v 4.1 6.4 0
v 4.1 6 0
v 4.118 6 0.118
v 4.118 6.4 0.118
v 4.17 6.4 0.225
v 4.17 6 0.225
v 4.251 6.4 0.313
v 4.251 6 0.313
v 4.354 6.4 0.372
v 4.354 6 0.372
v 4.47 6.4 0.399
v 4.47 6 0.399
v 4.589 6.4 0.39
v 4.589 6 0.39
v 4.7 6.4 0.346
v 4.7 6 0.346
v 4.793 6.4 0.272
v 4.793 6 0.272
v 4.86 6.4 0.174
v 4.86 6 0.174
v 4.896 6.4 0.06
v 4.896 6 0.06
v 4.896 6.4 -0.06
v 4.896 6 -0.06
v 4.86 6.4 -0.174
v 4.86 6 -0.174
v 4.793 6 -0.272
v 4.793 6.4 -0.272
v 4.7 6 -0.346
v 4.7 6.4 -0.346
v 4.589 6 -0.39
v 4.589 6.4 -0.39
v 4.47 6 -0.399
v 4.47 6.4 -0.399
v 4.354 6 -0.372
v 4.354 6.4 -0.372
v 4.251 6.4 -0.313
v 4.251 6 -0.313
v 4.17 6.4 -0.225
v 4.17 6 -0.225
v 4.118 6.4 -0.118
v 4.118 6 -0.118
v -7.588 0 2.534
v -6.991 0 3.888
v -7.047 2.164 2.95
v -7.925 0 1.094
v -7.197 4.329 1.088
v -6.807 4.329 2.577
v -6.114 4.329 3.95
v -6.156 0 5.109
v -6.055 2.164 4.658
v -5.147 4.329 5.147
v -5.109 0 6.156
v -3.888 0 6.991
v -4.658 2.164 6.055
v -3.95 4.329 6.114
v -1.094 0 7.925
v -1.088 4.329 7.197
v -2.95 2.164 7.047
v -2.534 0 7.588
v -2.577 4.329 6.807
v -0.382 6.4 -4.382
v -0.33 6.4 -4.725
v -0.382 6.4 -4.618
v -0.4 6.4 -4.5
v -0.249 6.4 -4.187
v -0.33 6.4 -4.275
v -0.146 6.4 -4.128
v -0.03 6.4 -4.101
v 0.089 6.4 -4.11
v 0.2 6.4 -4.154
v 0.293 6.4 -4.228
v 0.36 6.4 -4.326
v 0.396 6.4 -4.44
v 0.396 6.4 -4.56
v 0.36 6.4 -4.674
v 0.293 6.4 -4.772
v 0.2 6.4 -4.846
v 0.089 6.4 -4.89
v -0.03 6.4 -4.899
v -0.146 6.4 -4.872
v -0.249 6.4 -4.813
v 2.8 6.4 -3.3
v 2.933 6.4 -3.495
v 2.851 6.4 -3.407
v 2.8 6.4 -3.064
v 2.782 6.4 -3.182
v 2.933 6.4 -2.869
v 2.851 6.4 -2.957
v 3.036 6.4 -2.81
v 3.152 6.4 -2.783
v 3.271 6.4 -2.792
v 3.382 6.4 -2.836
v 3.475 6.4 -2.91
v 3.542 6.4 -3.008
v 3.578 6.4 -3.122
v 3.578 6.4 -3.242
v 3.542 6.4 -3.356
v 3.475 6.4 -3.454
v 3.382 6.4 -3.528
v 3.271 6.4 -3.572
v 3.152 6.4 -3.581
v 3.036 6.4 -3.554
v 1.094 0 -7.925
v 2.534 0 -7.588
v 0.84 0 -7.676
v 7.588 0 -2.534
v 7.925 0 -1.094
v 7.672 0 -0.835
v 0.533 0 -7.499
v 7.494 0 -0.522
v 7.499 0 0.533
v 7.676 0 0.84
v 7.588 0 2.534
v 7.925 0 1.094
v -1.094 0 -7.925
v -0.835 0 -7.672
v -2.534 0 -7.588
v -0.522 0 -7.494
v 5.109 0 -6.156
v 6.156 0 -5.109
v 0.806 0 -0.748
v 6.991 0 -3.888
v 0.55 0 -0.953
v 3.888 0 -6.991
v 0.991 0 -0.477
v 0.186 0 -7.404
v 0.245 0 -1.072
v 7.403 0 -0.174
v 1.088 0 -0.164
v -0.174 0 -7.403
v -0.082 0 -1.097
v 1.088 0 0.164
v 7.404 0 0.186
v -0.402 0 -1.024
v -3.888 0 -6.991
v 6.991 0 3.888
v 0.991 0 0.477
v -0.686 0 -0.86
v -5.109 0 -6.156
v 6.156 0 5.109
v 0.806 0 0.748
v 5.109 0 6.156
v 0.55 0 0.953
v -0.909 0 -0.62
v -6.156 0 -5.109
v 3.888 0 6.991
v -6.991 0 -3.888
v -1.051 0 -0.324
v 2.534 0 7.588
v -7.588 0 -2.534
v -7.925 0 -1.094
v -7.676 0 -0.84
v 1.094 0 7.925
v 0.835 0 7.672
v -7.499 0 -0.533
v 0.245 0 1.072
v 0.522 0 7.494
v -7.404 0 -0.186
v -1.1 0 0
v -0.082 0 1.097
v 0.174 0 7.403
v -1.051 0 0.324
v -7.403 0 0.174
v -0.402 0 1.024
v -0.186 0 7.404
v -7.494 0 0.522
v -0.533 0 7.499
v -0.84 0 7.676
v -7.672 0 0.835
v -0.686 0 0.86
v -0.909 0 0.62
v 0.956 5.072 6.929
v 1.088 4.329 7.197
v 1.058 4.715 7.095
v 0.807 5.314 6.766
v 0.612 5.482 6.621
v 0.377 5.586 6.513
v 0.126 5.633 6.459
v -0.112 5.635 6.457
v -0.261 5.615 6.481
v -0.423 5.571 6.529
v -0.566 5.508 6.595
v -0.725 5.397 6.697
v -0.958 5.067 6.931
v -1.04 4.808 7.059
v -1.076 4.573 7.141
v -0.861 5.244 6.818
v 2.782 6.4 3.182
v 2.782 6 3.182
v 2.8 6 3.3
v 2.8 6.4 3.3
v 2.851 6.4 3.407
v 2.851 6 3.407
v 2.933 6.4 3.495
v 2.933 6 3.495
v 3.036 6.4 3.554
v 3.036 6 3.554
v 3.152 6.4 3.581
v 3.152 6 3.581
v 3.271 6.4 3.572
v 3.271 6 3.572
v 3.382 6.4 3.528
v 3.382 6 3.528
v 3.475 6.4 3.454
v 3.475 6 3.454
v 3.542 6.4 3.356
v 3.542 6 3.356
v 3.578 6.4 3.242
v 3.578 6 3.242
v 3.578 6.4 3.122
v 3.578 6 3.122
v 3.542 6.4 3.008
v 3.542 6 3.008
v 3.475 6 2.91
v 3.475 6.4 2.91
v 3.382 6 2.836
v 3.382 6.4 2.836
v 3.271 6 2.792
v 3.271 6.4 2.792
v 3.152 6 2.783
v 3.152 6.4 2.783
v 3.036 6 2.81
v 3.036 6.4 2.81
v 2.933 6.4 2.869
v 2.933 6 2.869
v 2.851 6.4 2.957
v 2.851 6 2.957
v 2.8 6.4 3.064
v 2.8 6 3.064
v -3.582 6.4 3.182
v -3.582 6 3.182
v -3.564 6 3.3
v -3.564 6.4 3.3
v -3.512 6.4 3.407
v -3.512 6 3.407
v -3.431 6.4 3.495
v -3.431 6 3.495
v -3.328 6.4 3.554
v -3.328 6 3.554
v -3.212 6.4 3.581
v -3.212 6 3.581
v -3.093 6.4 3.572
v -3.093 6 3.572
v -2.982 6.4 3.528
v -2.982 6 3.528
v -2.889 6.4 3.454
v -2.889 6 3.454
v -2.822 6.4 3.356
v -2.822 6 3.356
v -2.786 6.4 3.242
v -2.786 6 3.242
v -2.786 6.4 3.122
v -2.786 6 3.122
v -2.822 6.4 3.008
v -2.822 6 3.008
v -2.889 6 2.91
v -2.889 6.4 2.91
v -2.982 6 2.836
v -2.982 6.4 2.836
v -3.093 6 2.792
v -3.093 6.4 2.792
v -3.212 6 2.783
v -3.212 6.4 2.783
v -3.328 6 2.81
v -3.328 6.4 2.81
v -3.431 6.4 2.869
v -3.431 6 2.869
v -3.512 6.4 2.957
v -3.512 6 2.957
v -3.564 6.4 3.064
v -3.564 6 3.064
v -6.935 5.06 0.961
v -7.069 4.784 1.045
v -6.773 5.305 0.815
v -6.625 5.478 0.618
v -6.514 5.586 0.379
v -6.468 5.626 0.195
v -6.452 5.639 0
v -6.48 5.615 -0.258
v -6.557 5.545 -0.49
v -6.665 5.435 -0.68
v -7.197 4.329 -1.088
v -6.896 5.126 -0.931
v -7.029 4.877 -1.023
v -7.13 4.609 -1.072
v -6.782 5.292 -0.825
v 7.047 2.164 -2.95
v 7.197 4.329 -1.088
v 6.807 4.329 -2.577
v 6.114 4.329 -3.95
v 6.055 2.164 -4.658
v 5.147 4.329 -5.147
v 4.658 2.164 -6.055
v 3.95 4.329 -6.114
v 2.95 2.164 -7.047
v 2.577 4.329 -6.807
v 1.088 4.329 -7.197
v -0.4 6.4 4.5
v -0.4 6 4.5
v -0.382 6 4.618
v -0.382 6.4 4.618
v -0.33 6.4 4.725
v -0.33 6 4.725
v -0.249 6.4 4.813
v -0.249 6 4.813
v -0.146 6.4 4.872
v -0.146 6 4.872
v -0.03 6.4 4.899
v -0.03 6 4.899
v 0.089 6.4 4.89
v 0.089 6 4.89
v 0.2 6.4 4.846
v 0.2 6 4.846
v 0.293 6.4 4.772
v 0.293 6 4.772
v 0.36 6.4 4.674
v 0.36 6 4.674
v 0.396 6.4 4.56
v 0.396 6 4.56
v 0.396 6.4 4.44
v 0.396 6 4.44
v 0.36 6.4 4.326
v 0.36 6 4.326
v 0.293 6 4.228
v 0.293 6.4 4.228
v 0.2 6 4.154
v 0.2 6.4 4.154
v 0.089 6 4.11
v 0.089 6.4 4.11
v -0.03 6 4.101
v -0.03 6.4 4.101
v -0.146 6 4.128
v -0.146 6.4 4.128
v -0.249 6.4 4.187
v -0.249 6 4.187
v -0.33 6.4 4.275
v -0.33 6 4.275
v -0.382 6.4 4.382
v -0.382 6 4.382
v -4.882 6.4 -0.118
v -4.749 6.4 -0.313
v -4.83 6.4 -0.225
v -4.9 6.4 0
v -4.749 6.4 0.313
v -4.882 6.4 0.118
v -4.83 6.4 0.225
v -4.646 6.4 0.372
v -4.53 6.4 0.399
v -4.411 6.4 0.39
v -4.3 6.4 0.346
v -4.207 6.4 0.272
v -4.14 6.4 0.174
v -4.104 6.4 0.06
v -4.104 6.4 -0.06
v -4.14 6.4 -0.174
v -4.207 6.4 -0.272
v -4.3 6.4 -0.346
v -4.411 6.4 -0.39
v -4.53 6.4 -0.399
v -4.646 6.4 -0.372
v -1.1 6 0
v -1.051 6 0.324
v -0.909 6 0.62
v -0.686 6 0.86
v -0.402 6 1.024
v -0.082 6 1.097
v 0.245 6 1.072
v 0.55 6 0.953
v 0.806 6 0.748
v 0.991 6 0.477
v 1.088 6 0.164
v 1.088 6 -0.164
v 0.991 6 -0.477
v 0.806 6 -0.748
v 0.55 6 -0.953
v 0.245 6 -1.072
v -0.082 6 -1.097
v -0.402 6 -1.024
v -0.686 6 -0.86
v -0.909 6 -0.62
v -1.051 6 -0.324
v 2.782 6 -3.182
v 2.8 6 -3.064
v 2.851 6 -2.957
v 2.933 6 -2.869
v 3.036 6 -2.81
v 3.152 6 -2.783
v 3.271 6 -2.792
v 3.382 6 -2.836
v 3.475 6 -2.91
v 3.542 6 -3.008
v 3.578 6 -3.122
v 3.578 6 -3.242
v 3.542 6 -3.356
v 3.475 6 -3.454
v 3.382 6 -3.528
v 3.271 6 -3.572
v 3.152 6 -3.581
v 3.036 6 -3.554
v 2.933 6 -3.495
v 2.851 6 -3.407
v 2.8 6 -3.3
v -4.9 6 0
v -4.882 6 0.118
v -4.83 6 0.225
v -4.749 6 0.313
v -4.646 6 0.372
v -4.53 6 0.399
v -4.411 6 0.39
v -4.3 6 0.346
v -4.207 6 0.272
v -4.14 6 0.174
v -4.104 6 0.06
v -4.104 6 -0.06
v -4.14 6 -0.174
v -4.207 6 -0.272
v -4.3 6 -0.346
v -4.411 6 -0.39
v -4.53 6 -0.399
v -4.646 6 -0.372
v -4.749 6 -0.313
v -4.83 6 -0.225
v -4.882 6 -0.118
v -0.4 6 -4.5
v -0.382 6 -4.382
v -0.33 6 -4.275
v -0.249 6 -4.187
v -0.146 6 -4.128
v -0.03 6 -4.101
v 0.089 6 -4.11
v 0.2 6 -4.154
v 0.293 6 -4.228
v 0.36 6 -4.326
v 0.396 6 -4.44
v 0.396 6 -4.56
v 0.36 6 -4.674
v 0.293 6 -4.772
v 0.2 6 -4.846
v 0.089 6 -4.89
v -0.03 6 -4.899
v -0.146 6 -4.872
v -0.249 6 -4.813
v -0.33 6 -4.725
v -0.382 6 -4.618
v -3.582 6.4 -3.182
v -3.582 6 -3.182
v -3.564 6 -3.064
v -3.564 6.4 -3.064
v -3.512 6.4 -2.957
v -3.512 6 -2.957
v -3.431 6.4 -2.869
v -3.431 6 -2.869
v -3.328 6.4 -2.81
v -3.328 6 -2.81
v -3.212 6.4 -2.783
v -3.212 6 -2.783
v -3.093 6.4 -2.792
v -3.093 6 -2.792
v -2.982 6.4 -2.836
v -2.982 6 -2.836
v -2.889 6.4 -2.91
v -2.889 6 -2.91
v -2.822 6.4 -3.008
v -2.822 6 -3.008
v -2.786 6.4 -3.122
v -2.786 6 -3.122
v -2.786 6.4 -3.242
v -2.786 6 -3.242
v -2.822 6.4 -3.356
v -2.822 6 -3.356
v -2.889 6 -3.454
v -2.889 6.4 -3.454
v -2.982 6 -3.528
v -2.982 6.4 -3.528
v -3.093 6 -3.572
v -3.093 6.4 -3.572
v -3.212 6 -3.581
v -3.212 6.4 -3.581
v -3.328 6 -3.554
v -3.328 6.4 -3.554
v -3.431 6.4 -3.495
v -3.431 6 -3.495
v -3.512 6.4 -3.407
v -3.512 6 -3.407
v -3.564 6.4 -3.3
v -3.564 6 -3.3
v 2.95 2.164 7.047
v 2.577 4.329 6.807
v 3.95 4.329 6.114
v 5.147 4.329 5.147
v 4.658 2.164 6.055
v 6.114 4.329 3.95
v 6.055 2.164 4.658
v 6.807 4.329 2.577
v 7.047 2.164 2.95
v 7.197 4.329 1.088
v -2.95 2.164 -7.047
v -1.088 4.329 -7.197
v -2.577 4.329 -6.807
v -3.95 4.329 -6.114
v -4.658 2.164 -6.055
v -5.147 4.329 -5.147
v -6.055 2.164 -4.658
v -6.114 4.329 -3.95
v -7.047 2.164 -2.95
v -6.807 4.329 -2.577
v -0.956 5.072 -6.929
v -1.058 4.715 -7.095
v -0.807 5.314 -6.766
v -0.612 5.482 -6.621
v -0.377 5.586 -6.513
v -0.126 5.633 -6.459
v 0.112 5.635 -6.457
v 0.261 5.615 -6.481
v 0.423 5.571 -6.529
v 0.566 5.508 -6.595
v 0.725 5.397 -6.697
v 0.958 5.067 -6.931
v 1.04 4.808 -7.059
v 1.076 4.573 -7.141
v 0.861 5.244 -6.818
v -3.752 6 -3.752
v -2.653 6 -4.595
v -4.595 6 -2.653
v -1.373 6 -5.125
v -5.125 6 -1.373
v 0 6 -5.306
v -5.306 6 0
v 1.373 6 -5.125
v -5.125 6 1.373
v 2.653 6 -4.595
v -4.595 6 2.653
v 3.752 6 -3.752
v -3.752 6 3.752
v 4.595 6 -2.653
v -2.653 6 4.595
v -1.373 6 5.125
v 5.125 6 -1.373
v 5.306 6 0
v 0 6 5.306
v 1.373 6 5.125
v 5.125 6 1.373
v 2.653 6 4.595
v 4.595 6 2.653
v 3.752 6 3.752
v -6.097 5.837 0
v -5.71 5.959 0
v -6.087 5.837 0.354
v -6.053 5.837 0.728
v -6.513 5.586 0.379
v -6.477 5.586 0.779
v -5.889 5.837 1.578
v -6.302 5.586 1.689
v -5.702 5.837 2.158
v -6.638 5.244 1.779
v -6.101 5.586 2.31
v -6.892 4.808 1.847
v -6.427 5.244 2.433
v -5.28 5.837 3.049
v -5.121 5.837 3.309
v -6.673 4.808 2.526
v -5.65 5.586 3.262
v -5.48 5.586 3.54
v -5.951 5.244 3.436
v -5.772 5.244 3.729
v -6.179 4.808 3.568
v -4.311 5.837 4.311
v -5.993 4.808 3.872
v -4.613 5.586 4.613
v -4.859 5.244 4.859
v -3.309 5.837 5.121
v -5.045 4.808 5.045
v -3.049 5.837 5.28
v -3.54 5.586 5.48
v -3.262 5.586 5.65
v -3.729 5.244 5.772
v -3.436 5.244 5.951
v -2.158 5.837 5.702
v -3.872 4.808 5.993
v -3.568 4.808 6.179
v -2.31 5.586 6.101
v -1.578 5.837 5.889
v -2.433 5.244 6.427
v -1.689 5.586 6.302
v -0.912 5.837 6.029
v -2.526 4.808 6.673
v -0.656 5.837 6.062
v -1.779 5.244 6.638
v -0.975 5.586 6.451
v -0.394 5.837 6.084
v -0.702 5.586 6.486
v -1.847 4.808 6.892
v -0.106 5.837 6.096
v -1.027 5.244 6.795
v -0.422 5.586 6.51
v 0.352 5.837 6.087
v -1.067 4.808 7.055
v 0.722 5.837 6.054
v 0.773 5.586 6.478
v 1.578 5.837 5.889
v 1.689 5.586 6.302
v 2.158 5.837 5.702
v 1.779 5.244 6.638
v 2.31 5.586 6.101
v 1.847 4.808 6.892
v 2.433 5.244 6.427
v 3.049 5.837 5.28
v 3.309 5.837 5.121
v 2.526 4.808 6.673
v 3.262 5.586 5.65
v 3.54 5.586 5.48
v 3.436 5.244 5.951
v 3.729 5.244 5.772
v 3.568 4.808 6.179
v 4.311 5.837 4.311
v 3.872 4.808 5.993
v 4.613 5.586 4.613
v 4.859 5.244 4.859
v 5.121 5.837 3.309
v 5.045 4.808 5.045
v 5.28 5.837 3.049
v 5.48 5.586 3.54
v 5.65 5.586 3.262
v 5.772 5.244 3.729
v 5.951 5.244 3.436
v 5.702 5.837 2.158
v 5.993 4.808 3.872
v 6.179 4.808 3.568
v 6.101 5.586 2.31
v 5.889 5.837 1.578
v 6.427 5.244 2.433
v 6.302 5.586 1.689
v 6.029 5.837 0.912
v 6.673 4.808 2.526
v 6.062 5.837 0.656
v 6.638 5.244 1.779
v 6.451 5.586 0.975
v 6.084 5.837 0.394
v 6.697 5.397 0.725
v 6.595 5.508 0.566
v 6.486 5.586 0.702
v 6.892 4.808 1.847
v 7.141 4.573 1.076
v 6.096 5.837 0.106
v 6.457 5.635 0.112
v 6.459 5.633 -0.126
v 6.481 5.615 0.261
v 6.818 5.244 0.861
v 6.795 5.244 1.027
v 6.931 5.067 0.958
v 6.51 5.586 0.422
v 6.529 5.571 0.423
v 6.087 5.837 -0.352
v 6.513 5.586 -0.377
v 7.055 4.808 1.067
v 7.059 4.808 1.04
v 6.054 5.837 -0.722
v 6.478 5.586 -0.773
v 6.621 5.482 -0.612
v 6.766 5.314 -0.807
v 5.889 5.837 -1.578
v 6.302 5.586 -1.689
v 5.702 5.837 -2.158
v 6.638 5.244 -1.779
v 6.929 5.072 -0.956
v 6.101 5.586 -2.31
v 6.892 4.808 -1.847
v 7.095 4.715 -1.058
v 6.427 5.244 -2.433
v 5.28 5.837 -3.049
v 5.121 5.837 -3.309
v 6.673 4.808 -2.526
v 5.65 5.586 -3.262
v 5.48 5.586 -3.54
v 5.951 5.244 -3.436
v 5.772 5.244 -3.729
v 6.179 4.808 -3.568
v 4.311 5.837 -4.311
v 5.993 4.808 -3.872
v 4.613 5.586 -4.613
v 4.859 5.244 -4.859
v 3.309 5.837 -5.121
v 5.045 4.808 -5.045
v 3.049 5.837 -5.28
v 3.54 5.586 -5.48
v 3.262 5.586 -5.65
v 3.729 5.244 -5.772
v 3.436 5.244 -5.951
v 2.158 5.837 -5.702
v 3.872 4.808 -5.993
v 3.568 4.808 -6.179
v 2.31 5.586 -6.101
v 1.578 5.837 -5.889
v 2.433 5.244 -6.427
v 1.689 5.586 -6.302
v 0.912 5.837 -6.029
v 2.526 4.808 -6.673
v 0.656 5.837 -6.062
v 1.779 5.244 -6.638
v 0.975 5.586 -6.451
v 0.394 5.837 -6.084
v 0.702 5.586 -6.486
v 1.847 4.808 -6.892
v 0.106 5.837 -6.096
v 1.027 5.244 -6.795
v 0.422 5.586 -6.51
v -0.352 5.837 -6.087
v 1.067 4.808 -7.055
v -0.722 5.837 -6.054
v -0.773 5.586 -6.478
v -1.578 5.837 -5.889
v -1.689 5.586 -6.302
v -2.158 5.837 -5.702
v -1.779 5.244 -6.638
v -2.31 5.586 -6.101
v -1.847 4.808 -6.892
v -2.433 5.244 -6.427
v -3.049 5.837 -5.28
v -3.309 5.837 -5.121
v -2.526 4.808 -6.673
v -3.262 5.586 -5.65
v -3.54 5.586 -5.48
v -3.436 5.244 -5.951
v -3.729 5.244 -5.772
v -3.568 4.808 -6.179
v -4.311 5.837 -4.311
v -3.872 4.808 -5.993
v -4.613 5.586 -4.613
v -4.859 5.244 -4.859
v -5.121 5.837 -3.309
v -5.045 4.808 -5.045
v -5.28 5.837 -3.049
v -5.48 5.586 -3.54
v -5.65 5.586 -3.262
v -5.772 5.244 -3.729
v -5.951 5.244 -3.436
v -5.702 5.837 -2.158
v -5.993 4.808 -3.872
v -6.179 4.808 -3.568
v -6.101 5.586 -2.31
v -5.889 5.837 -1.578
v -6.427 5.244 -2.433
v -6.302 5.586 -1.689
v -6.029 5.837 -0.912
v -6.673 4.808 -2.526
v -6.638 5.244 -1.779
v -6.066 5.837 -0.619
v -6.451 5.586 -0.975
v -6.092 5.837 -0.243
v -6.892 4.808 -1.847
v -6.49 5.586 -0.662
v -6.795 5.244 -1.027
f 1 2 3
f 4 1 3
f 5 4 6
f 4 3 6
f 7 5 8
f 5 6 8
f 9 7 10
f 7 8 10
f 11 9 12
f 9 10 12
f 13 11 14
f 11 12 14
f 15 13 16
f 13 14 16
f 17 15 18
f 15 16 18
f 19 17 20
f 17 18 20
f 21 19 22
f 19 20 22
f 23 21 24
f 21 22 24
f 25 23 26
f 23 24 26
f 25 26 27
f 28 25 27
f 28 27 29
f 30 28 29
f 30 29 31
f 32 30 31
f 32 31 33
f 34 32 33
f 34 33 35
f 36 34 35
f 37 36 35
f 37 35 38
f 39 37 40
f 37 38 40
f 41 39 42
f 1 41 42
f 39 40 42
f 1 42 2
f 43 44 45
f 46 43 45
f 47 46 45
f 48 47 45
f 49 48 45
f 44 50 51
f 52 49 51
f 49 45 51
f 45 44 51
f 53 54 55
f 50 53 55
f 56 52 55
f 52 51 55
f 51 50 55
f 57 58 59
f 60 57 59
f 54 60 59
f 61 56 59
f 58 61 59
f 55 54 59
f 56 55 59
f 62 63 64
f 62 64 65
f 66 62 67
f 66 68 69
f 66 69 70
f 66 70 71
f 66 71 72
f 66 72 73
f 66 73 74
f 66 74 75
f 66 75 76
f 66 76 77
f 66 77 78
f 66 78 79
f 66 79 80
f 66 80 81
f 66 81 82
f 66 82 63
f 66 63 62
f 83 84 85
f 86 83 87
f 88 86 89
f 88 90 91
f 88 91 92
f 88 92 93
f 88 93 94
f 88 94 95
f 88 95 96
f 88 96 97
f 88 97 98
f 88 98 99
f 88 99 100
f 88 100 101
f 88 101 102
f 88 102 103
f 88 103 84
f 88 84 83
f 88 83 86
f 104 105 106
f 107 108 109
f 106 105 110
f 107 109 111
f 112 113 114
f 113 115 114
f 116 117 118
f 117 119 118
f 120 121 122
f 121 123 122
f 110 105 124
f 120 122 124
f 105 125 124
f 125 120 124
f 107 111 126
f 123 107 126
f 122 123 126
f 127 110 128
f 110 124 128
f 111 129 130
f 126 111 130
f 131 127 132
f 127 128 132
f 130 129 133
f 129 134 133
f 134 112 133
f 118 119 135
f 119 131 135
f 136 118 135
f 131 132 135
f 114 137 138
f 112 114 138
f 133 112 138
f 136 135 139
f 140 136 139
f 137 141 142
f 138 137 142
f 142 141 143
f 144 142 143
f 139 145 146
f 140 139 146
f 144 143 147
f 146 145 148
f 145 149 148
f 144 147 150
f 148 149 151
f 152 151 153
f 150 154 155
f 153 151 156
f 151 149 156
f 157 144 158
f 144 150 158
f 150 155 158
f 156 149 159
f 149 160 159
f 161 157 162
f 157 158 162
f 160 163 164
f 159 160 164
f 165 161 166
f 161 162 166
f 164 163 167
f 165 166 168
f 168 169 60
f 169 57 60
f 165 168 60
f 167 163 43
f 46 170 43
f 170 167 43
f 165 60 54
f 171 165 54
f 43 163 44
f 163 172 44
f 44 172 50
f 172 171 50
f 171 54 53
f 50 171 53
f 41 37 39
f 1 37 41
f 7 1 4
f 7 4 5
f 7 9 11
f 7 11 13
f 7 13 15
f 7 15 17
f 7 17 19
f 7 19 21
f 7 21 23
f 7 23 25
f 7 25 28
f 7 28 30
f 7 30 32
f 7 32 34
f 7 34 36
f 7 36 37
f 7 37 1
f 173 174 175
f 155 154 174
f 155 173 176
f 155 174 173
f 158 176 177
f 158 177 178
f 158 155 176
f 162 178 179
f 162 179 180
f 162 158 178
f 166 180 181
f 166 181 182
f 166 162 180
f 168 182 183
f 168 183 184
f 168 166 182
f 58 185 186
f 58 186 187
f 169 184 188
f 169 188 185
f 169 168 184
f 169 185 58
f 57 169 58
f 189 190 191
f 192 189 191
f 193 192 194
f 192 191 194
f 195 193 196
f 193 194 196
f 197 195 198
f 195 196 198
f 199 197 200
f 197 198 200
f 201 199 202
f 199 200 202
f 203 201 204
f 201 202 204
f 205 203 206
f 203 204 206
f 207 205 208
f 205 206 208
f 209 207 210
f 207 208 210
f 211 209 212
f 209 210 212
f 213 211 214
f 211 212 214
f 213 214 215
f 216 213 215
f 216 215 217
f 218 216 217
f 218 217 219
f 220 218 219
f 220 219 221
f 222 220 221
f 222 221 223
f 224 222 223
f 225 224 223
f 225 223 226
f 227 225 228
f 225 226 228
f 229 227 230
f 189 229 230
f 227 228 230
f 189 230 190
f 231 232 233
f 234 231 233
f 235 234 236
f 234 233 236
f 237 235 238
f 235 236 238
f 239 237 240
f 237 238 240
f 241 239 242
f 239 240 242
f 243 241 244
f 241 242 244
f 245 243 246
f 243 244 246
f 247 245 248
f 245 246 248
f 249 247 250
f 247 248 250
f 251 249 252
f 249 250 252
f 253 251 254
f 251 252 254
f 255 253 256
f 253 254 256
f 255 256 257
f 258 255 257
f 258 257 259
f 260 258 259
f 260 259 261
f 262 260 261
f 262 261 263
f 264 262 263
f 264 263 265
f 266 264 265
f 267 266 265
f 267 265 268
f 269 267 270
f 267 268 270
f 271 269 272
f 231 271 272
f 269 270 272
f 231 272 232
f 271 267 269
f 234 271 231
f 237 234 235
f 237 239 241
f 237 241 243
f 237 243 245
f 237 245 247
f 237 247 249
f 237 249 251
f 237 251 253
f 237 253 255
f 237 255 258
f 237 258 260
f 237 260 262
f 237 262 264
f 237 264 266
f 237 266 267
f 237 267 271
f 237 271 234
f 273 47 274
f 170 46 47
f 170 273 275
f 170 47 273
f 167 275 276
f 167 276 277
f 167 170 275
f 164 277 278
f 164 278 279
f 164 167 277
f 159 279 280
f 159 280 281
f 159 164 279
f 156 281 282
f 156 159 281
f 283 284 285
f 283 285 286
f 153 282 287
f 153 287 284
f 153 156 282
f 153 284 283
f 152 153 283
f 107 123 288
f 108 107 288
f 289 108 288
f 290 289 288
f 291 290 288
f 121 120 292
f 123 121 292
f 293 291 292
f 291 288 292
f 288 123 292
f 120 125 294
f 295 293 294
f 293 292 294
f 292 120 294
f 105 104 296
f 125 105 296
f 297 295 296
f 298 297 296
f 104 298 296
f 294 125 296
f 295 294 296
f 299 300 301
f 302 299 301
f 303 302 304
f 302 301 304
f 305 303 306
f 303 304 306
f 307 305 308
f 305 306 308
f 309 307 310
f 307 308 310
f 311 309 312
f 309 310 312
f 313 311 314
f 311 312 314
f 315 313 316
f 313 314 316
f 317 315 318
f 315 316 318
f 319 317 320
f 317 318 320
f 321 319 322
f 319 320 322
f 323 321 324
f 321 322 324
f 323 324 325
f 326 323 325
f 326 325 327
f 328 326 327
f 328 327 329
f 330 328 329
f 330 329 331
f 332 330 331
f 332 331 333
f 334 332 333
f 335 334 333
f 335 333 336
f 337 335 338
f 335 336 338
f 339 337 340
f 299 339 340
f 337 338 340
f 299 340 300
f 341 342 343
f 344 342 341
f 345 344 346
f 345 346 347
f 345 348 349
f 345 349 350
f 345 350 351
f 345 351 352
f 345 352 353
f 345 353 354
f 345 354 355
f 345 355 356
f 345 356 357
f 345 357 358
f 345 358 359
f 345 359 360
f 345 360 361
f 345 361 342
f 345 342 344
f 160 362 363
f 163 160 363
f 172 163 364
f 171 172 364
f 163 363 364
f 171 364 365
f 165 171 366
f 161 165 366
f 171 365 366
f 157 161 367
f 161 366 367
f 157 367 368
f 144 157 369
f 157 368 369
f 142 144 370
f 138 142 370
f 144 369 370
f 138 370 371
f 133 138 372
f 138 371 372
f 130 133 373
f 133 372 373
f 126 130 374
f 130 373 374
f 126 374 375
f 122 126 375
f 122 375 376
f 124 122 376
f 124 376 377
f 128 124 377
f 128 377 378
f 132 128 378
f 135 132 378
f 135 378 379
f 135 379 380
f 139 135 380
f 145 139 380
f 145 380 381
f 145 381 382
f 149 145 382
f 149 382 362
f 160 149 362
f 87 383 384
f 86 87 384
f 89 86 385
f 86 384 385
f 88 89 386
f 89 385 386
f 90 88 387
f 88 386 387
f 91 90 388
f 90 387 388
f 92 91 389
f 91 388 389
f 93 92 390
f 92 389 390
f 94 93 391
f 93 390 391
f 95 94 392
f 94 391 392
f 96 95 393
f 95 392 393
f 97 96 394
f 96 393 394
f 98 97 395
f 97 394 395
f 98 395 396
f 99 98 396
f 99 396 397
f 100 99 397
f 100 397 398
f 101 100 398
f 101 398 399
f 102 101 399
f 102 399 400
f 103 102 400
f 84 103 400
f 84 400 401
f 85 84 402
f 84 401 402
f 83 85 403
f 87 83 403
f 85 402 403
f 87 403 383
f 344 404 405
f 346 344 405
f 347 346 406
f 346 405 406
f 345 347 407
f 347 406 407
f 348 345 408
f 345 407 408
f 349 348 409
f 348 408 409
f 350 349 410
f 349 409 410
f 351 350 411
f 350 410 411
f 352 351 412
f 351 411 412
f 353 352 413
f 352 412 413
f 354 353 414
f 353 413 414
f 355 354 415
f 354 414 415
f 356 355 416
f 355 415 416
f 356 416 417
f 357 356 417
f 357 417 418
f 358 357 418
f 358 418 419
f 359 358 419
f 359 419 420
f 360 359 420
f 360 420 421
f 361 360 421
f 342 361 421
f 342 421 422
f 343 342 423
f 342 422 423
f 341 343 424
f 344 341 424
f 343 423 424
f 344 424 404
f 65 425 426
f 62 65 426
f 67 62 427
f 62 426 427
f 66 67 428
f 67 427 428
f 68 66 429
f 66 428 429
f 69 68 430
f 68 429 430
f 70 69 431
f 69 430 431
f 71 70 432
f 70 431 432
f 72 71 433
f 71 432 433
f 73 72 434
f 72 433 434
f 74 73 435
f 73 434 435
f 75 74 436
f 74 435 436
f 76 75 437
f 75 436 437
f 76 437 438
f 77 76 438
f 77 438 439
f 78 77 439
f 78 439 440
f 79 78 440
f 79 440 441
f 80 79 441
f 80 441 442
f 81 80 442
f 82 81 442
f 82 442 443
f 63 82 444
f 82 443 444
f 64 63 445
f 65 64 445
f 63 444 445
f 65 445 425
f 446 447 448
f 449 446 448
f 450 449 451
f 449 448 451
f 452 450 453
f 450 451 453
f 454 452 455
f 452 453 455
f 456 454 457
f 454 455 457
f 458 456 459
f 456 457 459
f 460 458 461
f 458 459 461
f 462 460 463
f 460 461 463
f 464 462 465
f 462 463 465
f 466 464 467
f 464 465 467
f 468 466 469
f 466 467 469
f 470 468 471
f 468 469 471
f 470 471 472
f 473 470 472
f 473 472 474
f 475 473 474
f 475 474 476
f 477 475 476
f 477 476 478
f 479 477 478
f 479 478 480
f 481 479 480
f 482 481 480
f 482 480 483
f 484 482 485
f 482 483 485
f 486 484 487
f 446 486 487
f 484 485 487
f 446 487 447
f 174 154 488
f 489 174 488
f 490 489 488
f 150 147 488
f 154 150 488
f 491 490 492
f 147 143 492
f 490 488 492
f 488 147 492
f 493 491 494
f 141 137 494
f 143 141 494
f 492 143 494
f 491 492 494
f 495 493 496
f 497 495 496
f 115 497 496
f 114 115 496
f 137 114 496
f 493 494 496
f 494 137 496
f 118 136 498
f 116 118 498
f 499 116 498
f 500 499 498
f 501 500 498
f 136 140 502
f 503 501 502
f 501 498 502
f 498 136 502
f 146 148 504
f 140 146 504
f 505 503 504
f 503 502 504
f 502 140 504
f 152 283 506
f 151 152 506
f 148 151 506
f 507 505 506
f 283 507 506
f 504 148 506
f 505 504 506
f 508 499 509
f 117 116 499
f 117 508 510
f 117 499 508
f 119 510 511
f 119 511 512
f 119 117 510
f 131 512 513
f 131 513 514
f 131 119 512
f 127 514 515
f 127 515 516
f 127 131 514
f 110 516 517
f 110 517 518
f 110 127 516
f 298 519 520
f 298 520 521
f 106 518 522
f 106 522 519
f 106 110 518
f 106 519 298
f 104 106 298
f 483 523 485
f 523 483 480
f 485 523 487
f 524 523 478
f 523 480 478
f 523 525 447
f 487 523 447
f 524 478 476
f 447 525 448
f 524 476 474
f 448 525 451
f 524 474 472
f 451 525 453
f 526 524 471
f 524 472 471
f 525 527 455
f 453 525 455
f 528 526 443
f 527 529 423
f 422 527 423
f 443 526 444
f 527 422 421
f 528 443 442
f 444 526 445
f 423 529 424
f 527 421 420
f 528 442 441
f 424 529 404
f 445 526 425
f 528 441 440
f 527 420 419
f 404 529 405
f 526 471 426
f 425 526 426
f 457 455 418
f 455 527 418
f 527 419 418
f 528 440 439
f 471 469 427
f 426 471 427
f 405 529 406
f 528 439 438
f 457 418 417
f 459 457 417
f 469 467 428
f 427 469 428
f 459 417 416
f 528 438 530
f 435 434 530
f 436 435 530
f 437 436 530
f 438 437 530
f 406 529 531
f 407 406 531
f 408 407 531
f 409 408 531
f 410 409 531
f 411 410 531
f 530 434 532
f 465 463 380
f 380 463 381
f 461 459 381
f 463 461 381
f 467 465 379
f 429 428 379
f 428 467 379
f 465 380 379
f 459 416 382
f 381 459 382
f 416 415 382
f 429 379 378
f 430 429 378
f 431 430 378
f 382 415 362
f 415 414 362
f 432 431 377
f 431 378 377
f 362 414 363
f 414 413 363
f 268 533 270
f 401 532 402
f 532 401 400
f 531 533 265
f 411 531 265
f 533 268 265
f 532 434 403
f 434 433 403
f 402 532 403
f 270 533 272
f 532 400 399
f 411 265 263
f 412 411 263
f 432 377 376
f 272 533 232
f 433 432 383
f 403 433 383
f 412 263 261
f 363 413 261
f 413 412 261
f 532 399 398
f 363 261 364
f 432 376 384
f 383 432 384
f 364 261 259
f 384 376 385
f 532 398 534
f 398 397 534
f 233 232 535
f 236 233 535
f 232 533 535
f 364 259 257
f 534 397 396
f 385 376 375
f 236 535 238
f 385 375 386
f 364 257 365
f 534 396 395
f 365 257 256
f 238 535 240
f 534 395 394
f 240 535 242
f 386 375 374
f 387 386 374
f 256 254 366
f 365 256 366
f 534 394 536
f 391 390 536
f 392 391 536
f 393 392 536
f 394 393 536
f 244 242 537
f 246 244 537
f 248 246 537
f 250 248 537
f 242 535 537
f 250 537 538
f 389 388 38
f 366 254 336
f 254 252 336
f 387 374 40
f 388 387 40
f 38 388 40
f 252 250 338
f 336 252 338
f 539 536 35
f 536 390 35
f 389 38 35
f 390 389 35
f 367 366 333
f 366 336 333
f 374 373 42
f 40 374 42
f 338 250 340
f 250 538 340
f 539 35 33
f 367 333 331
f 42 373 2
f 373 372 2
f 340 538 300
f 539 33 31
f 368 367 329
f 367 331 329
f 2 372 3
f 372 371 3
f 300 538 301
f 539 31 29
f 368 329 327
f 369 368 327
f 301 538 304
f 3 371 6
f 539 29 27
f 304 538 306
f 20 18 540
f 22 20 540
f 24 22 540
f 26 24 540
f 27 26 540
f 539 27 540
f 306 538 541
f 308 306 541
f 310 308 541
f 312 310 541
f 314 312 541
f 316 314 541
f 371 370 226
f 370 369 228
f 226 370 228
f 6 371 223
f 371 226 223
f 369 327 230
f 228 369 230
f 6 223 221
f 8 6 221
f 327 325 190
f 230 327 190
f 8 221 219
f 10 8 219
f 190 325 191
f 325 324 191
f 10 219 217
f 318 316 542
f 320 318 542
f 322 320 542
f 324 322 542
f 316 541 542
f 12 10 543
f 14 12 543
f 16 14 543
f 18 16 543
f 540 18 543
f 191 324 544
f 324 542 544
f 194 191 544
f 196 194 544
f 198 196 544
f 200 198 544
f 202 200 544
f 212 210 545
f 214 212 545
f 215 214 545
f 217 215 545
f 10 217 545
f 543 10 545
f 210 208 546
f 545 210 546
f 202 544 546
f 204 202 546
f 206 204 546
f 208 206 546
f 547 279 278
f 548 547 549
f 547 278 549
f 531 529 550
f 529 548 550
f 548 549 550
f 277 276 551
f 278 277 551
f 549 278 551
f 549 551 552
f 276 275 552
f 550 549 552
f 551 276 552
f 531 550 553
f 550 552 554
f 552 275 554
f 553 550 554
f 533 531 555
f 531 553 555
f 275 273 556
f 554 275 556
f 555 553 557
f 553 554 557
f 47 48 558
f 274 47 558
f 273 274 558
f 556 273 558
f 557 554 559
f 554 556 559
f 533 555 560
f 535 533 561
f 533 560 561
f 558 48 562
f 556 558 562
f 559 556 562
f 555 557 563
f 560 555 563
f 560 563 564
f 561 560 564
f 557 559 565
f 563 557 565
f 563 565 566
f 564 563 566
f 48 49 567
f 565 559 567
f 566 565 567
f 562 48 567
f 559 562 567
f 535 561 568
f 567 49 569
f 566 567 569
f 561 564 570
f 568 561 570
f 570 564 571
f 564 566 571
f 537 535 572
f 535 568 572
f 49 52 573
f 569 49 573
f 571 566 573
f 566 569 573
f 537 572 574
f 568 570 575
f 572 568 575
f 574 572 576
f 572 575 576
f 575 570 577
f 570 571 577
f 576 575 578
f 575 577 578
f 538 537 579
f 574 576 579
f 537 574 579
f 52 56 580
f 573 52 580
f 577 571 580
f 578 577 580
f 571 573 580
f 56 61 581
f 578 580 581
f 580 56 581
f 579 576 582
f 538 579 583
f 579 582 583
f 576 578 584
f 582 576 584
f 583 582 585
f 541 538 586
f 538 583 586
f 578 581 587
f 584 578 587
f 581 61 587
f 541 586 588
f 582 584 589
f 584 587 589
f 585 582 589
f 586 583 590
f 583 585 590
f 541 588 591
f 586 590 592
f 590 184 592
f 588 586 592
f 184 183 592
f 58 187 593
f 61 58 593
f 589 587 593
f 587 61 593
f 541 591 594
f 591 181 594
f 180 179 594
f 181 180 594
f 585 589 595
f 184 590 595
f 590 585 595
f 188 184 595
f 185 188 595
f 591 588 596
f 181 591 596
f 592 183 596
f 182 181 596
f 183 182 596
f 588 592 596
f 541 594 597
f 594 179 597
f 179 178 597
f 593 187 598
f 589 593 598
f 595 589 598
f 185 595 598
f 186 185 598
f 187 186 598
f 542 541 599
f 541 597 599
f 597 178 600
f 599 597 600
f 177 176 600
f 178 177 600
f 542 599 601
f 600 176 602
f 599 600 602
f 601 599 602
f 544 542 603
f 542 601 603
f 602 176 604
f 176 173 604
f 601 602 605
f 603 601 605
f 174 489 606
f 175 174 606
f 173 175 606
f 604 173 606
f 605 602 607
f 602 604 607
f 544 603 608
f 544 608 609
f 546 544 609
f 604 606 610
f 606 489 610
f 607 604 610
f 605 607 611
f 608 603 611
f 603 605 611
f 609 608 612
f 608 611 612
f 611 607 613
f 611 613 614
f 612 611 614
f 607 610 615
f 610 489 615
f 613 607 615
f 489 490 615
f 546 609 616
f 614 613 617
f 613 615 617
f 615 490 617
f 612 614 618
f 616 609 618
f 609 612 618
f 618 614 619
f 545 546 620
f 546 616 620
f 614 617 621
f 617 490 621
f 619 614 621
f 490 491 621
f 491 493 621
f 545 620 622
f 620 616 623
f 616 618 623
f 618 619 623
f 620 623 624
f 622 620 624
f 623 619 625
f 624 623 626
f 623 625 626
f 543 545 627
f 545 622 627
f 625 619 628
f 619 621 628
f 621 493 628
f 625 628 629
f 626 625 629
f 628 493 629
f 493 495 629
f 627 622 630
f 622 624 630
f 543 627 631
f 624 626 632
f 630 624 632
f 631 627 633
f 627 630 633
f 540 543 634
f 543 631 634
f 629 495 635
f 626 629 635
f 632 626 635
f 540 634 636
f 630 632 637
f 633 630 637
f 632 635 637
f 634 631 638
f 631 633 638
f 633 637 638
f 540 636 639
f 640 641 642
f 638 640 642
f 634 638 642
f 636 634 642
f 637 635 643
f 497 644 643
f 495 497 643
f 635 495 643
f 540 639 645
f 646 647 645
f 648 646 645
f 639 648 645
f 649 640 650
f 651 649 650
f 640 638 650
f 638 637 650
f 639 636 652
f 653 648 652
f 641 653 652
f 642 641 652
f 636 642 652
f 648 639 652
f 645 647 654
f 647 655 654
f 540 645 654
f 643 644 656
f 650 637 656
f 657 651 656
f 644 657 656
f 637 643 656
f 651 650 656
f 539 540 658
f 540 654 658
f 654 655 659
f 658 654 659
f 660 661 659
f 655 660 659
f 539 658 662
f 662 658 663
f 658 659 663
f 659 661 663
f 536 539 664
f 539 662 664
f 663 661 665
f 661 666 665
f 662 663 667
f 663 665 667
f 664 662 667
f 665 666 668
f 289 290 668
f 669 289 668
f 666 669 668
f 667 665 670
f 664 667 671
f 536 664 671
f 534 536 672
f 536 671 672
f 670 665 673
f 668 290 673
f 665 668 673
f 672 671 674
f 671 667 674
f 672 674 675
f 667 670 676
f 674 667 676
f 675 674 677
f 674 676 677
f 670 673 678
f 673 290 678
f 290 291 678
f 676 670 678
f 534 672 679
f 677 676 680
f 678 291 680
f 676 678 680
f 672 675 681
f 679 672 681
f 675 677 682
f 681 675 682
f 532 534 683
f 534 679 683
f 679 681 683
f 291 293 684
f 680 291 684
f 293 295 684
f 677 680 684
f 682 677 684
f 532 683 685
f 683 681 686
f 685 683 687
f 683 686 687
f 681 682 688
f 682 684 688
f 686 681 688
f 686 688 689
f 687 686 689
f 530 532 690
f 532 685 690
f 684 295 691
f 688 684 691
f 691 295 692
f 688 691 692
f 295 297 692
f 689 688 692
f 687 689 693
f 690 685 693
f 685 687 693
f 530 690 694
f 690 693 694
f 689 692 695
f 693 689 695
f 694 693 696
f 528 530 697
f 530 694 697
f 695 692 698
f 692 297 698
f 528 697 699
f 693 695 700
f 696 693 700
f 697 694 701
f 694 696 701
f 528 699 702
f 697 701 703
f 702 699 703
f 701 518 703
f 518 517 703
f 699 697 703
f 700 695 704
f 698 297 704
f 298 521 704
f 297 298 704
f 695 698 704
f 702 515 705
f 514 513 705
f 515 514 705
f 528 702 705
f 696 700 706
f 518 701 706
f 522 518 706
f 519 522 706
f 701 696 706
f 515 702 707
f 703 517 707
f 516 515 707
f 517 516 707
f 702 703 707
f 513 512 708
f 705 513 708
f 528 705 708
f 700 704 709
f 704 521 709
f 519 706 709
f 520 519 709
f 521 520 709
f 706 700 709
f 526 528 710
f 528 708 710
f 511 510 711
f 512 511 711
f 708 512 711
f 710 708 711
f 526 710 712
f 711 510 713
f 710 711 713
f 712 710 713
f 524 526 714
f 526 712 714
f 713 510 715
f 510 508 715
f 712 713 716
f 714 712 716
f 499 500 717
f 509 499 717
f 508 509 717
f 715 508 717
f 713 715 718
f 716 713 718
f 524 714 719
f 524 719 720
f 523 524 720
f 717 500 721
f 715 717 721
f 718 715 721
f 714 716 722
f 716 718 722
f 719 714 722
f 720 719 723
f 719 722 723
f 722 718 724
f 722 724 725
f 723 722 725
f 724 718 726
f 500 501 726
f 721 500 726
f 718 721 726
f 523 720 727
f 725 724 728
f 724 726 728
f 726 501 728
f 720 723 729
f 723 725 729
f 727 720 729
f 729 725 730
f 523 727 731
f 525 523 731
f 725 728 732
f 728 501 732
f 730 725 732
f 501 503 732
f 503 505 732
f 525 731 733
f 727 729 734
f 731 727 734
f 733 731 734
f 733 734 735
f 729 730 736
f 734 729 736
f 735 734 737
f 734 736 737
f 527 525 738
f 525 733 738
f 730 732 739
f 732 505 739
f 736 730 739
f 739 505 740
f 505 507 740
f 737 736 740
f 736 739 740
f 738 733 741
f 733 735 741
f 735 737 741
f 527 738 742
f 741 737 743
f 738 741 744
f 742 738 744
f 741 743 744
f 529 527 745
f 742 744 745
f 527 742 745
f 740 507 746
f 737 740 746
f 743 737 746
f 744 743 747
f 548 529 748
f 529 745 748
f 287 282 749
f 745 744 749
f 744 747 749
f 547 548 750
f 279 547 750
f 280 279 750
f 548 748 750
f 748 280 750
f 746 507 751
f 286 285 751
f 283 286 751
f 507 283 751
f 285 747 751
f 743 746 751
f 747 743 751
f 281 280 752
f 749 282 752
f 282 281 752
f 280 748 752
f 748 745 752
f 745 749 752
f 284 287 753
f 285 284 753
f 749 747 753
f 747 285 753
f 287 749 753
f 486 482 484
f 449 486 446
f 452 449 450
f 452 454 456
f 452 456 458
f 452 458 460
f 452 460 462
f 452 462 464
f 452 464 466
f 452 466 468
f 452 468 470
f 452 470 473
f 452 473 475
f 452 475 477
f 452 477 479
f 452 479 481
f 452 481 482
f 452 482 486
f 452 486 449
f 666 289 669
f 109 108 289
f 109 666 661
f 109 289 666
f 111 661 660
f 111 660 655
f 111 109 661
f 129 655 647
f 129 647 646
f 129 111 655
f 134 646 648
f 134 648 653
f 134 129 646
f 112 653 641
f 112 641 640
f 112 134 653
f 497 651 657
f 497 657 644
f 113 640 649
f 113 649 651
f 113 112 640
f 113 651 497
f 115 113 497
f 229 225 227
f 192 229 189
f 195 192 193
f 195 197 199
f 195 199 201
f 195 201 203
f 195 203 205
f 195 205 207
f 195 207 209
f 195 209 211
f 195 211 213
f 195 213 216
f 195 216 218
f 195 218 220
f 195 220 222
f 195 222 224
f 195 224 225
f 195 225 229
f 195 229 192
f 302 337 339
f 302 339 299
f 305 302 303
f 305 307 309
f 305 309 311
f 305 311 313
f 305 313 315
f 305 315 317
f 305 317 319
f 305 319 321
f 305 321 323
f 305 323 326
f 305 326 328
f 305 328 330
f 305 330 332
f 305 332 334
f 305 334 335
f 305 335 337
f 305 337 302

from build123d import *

# Parameters (mm, degrees)
F2_R     = 0.4
F3_DEPTH = 0.4
F6_COUNT = 4
F8_R     = 1.1
F9_DEPTH = 6.001


with BuildPart() as f1:
    # F0 (on Top) → F1 (revolve)
    with BuildSketch(Plane.XY):
        with BuildLine():
            Line((-8, 0), (0, 0))
            Line((0, 0), (0, 6))
            Line((0, 6), (-5.305746, 6))
            ThreePointArc((-5.305746, 6), (-6.598496, 5.52604), (-7.278534, 4.328798))
            Line((-7.278534, 4.328798), (-8, 0))
        make_face()
    revolve(axis=Axis((0, 13.402597, 0), (0, 1, 0)))

    # F2 (on face) → F3 (join)
    with BuildSketch(Plane(origin=(0, 6, 0), x_dir=(-1, 0, 0), z_dir=(0, 1, 0))):
        with Locations((0, 4.5)):
            Circle(F2_R)
        with Locations((4.5, 0)):
            Circle(F2_R)
        with Locations((0, -4.5)):
            Circle(F2_R)
        with Locations((-4.5, 0)):
            Circle(F2_R)
        with Locations((-3.181981, 3.181981)):
            Circle(F2_R)
        with Locations((3.181981, 3.181981)):
            Circle(F2_R)
        with Locations((3.181981, -3.181981)):
            Circle(F2_R)
        with Locations((-3.181981, -3.181981)):
            Circle(F2_R)
    extrude(amount=F3_DEPTH)


with BuildPart() as f5:
    # F4 (on Right) → F5 (revolve)
    with BuildSketch(Plane.YZ):
        Polygon((-0.443557, 10.304272), (-0.673715, 8.923321), (6.578678, 7.714589), (6.808836, 9.09554), align=None)
    revolve(axis=Axis((0, 5.520192, 7.891003), (0, 0.986394, -0.164399)))


with BuildPart() as f6_1:
    # F6: instance of F5
    add(f5.part.rotate(Axis((0, 0, 0), (0, 1, 0)), 1 * 360 / F6_COUNT))


with BuildPart() as f6_2:
    # F6: instance of F5
    add(f5.part.rotate(Axis((0, 0, 0), (0, 1, 0)), 2 * 360 / F6_COUNT))


with BuildPart() as f6_3:
    # F6: instance of F5
    add(f5.part.rotate(Axis((0, 0, 0), (0, 1, 0)), 3 * 360 / F6_COUNT))


with BuildPart() as f1_1:
    add(f1.part)

    # F7: cut F5, F6_1, F6_2, F6_3
    add(f5.part, mode=Mode.SUBTRACT)
    add(f6_1.part, mode=Mode.SUBTRACT)
    add(f6_2.part, mode=Mode.SUBTRACT)
    add(f6_3.part, mode=Mode.SUBTRACT)

    # F8 (on face) → F9 (cut, through all)
    with BuildSketch(Plane(origin=(0, 6, 0), x_dir=(-1, 0, 0), z_dir=(0, 1, 0))):
        Circle(F8_R)
    extrude(amount=-F9_DEPTH, mode=Mode.SUBTRACT)


solid = f1_1.part
